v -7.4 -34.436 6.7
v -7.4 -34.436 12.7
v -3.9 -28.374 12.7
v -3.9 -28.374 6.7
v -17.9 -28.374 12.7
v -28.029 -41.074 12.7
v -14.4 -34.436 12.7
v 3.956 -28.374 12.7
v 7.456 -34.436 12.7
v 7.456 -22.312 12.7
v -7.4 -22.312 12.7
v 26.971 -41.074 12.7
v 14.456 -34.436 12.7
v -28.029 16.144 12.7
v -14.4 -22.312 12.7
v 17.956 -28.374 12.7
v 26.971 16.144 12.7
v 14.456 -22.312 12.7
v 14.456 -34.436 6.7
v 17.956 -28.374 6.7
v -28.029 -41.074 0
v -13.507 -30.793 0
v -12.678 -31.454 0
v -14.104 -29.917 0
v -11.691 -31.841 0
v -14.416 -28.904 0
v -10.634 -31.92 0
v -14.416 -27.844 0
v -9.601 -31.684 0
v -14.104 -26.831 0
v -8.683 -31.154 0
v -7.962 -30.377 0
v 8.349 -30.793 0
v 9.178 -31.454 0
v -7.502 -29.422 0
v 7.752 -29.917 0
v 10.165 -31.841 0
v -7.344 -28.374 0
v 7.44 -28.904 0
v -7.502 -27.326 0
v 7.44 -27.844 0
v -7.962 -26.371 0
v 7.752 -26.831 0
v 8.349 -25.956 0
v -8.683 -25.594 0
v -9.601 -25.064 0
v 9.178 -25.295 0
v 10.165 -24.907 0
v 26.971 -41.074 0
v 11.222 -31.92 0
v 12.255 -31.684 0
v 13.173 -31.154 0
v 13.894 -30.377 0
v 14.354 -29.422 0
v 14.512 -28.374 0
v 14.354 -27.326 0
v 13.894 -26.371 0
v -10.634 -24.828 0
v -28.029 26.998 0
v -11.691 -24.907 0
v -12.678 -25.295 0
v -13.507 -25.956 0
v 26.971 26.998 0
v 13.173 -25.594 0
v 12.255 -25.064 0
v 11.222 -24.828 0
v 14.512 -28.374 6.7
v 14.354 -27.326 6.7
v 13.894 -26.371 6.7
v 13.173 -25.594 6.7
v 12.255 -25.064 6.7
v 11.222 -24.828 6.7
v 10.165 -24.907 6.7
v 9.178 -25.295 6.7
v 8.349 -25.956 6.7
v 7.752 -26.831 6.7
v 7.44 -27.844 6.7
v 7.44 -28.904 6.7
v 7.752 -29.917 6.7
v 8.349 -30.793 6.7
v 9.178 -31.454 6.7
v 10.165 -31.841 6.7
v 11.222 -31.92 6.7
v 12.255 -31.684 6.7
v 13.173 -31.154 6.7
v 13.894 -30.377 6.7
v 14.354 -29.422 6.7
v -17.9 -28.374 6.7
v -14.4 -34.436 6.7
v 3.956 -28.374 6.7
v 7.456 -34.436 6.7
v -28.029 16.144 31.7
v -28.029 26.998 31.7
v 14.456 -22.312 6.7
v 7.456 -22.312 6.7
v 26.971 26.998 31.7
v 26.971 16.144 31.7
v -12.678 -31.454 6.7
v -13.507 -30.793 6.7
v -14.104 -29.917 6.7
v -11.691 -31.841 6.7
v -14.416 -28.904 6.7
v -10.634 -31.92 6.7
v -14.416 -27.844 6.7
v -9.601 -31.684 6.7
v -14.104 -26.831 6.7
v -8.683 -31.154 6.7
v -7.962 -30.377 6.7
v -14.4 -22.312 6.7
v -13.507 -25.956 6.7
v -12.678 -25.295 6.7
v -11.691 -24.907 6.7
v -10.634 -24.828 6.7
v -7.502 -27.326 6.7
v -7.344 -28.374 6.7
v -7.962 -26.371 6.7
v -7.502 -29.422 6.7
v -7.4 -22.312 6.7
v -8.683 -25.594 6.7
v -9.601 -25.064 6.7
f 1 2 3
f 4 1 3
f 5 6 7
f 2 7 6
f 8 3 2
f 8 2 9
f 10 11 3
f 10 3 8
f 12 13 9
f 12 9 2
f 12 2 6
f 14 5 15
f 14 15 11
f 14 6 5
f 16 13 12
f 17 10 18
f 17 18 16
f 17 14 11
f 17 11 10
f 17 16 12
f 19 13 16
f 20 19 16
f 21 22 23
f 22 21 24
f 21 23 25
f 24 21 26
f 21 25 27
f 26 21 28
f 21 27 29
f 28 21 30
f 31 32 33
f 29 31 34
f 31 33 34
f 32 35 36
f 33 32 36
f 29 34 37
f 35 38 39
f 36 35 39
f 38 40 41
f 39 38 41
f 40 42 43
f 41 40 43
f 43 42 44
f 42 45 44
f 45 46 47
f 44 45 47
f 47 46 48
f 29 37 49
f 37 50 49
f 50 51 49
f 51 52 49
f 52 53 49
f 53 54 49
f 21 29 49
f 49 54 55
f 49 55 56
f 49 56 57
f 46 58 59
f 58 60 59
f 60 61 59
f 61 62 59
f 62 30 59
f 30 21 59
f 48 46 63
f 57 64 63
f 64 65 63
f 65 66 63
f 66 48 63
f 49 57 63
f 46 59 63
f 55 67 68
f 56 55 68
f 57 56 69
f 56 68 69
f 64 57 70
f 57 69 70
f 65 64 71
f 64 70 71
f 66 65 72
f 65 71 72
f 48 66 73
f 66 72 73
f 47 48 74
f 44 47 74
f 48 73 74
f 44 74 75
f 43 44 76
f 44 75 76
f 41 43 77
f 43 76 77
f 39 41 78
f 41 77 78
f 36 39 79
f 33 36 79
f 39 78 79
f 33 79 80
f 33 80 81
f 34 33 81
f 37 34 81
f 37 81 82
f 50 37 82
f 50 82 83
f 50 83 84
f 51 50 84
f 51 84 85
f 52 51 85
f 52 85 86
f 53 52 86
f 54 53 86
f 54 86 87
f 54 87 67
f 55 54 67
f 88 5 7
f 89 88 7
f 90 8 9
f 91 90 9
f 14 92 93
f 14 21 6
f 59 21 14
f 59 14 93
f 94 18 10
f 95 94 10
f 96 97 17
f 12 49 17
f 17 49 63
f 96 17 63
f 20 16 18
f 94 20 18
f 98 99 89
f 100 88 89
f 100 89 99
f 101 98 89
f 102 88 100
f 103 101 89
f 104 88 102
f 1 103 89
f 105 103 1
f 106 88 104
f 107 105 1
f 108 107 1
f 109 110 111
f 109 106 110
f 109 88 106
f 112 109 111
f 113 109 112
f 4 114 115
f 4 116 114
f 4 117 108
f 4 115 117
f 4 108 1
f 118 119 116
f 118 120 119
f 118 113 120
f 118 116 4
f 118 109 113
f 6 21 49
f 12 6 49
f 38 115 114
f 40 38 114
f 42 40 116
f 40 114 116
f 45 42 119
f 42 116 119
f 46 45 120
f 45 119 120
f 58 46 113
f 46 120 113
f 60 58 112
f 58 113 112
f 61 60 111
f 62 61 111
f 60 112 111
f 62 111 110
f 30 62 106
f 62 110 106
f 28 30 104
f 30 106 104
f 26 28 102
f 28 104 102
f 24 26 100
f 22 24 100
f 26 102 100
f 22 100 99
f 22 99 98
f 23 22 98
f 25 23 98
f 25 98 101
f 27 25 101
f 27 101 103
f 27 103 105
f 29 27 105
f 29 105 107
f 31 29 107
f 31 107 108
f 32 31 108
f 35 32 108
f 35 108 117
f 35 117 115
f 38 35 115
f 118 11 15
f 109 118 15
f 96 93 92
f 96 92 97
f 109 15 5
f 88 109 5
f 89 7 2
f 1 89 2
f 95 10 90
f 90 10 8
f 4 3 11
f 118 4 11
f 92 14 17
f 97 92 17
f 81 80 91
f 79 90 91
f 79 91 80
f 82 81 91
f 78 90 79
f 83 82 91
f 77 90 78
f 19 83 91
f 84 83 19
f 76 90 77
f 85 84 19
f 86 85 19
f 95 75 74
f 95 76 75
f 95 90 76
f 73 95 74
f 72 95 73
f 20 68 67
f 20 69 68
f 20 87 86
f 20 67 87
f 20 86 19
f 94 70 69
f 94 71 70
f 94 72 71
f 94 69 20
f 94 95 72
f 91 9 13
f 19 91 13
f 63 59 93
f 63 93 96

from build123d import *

# Parameters (mm, degrees)
F0_W     = 55
F0_H     = 68.072
F1_DEPTH = 12.7
F2_R     = 3.556
F3_DEPTH = 6
F4_DEPTH = 12.7
F5_W     = 55
F5_H     = 10.8541566
F6_DEPTH = 19


with BuildPart() as f1:
    # F0 (on Top) → F1 (new body)
    with BuildSketch(Plane.XY):
        with Locations((-0.5289506033, -7.0382300764)):
            Rectangle(F0_W, F0_H)
    extrude(amount=F1_DEPTH)

    # F2 (on face) → F3 (cut)
    with BuildSketch(Plane.XY.offset(12.7)):
        Polygon((-14.4, -22.3120522499), (-17.9, -28.3742300764), (-14.4, -34.4364079029), (-7.4, -34.4364079029), (-3.9, -28.3742300764), (-7.4, -22.3120522499), align=None)
        with Locations((-10.9, -28.3742300764)):
            Circle(F2_R, mode=Mode.SUBTRACT)
        Polygon((14.456, -34.4364079029), (17.956, -28.3742300764), (14.456, -22.3120522499), (7.456, -22.3120522499), (3.956, -28.3742300764), (7.456, -34.4364079029), align=None)
        with Locations((10.956, -28.3742300764)):
            Circle(F2_R, mode=Mode.SUBTRACT)
    extrude(amount=-F3_DEPTH, mode=Mode.SUBTRACT)

    # F4 (cut, through all): faces of the model
    f4_faces = [f1.faces().sort_by_distance(p)[0] for p in [
        (-10.9, -28.3742300764, 12.7),
        (10.956, -28.3742300764, 12.7),
    ]]
    extrude(f4_faces, amount=-F4_DEPTH, mode=Mode.SUBTRACT)

    # F5 (on face) → F6 (join)
    with BuildSketch(Plane.XY.offset(12.7)):
        with Locations((-0.5289506033, 21.5706916236)):
            Rectangle(F5_W, F5_H)
    extrude(amount=F6_DEPTH)


solid = f1.part
